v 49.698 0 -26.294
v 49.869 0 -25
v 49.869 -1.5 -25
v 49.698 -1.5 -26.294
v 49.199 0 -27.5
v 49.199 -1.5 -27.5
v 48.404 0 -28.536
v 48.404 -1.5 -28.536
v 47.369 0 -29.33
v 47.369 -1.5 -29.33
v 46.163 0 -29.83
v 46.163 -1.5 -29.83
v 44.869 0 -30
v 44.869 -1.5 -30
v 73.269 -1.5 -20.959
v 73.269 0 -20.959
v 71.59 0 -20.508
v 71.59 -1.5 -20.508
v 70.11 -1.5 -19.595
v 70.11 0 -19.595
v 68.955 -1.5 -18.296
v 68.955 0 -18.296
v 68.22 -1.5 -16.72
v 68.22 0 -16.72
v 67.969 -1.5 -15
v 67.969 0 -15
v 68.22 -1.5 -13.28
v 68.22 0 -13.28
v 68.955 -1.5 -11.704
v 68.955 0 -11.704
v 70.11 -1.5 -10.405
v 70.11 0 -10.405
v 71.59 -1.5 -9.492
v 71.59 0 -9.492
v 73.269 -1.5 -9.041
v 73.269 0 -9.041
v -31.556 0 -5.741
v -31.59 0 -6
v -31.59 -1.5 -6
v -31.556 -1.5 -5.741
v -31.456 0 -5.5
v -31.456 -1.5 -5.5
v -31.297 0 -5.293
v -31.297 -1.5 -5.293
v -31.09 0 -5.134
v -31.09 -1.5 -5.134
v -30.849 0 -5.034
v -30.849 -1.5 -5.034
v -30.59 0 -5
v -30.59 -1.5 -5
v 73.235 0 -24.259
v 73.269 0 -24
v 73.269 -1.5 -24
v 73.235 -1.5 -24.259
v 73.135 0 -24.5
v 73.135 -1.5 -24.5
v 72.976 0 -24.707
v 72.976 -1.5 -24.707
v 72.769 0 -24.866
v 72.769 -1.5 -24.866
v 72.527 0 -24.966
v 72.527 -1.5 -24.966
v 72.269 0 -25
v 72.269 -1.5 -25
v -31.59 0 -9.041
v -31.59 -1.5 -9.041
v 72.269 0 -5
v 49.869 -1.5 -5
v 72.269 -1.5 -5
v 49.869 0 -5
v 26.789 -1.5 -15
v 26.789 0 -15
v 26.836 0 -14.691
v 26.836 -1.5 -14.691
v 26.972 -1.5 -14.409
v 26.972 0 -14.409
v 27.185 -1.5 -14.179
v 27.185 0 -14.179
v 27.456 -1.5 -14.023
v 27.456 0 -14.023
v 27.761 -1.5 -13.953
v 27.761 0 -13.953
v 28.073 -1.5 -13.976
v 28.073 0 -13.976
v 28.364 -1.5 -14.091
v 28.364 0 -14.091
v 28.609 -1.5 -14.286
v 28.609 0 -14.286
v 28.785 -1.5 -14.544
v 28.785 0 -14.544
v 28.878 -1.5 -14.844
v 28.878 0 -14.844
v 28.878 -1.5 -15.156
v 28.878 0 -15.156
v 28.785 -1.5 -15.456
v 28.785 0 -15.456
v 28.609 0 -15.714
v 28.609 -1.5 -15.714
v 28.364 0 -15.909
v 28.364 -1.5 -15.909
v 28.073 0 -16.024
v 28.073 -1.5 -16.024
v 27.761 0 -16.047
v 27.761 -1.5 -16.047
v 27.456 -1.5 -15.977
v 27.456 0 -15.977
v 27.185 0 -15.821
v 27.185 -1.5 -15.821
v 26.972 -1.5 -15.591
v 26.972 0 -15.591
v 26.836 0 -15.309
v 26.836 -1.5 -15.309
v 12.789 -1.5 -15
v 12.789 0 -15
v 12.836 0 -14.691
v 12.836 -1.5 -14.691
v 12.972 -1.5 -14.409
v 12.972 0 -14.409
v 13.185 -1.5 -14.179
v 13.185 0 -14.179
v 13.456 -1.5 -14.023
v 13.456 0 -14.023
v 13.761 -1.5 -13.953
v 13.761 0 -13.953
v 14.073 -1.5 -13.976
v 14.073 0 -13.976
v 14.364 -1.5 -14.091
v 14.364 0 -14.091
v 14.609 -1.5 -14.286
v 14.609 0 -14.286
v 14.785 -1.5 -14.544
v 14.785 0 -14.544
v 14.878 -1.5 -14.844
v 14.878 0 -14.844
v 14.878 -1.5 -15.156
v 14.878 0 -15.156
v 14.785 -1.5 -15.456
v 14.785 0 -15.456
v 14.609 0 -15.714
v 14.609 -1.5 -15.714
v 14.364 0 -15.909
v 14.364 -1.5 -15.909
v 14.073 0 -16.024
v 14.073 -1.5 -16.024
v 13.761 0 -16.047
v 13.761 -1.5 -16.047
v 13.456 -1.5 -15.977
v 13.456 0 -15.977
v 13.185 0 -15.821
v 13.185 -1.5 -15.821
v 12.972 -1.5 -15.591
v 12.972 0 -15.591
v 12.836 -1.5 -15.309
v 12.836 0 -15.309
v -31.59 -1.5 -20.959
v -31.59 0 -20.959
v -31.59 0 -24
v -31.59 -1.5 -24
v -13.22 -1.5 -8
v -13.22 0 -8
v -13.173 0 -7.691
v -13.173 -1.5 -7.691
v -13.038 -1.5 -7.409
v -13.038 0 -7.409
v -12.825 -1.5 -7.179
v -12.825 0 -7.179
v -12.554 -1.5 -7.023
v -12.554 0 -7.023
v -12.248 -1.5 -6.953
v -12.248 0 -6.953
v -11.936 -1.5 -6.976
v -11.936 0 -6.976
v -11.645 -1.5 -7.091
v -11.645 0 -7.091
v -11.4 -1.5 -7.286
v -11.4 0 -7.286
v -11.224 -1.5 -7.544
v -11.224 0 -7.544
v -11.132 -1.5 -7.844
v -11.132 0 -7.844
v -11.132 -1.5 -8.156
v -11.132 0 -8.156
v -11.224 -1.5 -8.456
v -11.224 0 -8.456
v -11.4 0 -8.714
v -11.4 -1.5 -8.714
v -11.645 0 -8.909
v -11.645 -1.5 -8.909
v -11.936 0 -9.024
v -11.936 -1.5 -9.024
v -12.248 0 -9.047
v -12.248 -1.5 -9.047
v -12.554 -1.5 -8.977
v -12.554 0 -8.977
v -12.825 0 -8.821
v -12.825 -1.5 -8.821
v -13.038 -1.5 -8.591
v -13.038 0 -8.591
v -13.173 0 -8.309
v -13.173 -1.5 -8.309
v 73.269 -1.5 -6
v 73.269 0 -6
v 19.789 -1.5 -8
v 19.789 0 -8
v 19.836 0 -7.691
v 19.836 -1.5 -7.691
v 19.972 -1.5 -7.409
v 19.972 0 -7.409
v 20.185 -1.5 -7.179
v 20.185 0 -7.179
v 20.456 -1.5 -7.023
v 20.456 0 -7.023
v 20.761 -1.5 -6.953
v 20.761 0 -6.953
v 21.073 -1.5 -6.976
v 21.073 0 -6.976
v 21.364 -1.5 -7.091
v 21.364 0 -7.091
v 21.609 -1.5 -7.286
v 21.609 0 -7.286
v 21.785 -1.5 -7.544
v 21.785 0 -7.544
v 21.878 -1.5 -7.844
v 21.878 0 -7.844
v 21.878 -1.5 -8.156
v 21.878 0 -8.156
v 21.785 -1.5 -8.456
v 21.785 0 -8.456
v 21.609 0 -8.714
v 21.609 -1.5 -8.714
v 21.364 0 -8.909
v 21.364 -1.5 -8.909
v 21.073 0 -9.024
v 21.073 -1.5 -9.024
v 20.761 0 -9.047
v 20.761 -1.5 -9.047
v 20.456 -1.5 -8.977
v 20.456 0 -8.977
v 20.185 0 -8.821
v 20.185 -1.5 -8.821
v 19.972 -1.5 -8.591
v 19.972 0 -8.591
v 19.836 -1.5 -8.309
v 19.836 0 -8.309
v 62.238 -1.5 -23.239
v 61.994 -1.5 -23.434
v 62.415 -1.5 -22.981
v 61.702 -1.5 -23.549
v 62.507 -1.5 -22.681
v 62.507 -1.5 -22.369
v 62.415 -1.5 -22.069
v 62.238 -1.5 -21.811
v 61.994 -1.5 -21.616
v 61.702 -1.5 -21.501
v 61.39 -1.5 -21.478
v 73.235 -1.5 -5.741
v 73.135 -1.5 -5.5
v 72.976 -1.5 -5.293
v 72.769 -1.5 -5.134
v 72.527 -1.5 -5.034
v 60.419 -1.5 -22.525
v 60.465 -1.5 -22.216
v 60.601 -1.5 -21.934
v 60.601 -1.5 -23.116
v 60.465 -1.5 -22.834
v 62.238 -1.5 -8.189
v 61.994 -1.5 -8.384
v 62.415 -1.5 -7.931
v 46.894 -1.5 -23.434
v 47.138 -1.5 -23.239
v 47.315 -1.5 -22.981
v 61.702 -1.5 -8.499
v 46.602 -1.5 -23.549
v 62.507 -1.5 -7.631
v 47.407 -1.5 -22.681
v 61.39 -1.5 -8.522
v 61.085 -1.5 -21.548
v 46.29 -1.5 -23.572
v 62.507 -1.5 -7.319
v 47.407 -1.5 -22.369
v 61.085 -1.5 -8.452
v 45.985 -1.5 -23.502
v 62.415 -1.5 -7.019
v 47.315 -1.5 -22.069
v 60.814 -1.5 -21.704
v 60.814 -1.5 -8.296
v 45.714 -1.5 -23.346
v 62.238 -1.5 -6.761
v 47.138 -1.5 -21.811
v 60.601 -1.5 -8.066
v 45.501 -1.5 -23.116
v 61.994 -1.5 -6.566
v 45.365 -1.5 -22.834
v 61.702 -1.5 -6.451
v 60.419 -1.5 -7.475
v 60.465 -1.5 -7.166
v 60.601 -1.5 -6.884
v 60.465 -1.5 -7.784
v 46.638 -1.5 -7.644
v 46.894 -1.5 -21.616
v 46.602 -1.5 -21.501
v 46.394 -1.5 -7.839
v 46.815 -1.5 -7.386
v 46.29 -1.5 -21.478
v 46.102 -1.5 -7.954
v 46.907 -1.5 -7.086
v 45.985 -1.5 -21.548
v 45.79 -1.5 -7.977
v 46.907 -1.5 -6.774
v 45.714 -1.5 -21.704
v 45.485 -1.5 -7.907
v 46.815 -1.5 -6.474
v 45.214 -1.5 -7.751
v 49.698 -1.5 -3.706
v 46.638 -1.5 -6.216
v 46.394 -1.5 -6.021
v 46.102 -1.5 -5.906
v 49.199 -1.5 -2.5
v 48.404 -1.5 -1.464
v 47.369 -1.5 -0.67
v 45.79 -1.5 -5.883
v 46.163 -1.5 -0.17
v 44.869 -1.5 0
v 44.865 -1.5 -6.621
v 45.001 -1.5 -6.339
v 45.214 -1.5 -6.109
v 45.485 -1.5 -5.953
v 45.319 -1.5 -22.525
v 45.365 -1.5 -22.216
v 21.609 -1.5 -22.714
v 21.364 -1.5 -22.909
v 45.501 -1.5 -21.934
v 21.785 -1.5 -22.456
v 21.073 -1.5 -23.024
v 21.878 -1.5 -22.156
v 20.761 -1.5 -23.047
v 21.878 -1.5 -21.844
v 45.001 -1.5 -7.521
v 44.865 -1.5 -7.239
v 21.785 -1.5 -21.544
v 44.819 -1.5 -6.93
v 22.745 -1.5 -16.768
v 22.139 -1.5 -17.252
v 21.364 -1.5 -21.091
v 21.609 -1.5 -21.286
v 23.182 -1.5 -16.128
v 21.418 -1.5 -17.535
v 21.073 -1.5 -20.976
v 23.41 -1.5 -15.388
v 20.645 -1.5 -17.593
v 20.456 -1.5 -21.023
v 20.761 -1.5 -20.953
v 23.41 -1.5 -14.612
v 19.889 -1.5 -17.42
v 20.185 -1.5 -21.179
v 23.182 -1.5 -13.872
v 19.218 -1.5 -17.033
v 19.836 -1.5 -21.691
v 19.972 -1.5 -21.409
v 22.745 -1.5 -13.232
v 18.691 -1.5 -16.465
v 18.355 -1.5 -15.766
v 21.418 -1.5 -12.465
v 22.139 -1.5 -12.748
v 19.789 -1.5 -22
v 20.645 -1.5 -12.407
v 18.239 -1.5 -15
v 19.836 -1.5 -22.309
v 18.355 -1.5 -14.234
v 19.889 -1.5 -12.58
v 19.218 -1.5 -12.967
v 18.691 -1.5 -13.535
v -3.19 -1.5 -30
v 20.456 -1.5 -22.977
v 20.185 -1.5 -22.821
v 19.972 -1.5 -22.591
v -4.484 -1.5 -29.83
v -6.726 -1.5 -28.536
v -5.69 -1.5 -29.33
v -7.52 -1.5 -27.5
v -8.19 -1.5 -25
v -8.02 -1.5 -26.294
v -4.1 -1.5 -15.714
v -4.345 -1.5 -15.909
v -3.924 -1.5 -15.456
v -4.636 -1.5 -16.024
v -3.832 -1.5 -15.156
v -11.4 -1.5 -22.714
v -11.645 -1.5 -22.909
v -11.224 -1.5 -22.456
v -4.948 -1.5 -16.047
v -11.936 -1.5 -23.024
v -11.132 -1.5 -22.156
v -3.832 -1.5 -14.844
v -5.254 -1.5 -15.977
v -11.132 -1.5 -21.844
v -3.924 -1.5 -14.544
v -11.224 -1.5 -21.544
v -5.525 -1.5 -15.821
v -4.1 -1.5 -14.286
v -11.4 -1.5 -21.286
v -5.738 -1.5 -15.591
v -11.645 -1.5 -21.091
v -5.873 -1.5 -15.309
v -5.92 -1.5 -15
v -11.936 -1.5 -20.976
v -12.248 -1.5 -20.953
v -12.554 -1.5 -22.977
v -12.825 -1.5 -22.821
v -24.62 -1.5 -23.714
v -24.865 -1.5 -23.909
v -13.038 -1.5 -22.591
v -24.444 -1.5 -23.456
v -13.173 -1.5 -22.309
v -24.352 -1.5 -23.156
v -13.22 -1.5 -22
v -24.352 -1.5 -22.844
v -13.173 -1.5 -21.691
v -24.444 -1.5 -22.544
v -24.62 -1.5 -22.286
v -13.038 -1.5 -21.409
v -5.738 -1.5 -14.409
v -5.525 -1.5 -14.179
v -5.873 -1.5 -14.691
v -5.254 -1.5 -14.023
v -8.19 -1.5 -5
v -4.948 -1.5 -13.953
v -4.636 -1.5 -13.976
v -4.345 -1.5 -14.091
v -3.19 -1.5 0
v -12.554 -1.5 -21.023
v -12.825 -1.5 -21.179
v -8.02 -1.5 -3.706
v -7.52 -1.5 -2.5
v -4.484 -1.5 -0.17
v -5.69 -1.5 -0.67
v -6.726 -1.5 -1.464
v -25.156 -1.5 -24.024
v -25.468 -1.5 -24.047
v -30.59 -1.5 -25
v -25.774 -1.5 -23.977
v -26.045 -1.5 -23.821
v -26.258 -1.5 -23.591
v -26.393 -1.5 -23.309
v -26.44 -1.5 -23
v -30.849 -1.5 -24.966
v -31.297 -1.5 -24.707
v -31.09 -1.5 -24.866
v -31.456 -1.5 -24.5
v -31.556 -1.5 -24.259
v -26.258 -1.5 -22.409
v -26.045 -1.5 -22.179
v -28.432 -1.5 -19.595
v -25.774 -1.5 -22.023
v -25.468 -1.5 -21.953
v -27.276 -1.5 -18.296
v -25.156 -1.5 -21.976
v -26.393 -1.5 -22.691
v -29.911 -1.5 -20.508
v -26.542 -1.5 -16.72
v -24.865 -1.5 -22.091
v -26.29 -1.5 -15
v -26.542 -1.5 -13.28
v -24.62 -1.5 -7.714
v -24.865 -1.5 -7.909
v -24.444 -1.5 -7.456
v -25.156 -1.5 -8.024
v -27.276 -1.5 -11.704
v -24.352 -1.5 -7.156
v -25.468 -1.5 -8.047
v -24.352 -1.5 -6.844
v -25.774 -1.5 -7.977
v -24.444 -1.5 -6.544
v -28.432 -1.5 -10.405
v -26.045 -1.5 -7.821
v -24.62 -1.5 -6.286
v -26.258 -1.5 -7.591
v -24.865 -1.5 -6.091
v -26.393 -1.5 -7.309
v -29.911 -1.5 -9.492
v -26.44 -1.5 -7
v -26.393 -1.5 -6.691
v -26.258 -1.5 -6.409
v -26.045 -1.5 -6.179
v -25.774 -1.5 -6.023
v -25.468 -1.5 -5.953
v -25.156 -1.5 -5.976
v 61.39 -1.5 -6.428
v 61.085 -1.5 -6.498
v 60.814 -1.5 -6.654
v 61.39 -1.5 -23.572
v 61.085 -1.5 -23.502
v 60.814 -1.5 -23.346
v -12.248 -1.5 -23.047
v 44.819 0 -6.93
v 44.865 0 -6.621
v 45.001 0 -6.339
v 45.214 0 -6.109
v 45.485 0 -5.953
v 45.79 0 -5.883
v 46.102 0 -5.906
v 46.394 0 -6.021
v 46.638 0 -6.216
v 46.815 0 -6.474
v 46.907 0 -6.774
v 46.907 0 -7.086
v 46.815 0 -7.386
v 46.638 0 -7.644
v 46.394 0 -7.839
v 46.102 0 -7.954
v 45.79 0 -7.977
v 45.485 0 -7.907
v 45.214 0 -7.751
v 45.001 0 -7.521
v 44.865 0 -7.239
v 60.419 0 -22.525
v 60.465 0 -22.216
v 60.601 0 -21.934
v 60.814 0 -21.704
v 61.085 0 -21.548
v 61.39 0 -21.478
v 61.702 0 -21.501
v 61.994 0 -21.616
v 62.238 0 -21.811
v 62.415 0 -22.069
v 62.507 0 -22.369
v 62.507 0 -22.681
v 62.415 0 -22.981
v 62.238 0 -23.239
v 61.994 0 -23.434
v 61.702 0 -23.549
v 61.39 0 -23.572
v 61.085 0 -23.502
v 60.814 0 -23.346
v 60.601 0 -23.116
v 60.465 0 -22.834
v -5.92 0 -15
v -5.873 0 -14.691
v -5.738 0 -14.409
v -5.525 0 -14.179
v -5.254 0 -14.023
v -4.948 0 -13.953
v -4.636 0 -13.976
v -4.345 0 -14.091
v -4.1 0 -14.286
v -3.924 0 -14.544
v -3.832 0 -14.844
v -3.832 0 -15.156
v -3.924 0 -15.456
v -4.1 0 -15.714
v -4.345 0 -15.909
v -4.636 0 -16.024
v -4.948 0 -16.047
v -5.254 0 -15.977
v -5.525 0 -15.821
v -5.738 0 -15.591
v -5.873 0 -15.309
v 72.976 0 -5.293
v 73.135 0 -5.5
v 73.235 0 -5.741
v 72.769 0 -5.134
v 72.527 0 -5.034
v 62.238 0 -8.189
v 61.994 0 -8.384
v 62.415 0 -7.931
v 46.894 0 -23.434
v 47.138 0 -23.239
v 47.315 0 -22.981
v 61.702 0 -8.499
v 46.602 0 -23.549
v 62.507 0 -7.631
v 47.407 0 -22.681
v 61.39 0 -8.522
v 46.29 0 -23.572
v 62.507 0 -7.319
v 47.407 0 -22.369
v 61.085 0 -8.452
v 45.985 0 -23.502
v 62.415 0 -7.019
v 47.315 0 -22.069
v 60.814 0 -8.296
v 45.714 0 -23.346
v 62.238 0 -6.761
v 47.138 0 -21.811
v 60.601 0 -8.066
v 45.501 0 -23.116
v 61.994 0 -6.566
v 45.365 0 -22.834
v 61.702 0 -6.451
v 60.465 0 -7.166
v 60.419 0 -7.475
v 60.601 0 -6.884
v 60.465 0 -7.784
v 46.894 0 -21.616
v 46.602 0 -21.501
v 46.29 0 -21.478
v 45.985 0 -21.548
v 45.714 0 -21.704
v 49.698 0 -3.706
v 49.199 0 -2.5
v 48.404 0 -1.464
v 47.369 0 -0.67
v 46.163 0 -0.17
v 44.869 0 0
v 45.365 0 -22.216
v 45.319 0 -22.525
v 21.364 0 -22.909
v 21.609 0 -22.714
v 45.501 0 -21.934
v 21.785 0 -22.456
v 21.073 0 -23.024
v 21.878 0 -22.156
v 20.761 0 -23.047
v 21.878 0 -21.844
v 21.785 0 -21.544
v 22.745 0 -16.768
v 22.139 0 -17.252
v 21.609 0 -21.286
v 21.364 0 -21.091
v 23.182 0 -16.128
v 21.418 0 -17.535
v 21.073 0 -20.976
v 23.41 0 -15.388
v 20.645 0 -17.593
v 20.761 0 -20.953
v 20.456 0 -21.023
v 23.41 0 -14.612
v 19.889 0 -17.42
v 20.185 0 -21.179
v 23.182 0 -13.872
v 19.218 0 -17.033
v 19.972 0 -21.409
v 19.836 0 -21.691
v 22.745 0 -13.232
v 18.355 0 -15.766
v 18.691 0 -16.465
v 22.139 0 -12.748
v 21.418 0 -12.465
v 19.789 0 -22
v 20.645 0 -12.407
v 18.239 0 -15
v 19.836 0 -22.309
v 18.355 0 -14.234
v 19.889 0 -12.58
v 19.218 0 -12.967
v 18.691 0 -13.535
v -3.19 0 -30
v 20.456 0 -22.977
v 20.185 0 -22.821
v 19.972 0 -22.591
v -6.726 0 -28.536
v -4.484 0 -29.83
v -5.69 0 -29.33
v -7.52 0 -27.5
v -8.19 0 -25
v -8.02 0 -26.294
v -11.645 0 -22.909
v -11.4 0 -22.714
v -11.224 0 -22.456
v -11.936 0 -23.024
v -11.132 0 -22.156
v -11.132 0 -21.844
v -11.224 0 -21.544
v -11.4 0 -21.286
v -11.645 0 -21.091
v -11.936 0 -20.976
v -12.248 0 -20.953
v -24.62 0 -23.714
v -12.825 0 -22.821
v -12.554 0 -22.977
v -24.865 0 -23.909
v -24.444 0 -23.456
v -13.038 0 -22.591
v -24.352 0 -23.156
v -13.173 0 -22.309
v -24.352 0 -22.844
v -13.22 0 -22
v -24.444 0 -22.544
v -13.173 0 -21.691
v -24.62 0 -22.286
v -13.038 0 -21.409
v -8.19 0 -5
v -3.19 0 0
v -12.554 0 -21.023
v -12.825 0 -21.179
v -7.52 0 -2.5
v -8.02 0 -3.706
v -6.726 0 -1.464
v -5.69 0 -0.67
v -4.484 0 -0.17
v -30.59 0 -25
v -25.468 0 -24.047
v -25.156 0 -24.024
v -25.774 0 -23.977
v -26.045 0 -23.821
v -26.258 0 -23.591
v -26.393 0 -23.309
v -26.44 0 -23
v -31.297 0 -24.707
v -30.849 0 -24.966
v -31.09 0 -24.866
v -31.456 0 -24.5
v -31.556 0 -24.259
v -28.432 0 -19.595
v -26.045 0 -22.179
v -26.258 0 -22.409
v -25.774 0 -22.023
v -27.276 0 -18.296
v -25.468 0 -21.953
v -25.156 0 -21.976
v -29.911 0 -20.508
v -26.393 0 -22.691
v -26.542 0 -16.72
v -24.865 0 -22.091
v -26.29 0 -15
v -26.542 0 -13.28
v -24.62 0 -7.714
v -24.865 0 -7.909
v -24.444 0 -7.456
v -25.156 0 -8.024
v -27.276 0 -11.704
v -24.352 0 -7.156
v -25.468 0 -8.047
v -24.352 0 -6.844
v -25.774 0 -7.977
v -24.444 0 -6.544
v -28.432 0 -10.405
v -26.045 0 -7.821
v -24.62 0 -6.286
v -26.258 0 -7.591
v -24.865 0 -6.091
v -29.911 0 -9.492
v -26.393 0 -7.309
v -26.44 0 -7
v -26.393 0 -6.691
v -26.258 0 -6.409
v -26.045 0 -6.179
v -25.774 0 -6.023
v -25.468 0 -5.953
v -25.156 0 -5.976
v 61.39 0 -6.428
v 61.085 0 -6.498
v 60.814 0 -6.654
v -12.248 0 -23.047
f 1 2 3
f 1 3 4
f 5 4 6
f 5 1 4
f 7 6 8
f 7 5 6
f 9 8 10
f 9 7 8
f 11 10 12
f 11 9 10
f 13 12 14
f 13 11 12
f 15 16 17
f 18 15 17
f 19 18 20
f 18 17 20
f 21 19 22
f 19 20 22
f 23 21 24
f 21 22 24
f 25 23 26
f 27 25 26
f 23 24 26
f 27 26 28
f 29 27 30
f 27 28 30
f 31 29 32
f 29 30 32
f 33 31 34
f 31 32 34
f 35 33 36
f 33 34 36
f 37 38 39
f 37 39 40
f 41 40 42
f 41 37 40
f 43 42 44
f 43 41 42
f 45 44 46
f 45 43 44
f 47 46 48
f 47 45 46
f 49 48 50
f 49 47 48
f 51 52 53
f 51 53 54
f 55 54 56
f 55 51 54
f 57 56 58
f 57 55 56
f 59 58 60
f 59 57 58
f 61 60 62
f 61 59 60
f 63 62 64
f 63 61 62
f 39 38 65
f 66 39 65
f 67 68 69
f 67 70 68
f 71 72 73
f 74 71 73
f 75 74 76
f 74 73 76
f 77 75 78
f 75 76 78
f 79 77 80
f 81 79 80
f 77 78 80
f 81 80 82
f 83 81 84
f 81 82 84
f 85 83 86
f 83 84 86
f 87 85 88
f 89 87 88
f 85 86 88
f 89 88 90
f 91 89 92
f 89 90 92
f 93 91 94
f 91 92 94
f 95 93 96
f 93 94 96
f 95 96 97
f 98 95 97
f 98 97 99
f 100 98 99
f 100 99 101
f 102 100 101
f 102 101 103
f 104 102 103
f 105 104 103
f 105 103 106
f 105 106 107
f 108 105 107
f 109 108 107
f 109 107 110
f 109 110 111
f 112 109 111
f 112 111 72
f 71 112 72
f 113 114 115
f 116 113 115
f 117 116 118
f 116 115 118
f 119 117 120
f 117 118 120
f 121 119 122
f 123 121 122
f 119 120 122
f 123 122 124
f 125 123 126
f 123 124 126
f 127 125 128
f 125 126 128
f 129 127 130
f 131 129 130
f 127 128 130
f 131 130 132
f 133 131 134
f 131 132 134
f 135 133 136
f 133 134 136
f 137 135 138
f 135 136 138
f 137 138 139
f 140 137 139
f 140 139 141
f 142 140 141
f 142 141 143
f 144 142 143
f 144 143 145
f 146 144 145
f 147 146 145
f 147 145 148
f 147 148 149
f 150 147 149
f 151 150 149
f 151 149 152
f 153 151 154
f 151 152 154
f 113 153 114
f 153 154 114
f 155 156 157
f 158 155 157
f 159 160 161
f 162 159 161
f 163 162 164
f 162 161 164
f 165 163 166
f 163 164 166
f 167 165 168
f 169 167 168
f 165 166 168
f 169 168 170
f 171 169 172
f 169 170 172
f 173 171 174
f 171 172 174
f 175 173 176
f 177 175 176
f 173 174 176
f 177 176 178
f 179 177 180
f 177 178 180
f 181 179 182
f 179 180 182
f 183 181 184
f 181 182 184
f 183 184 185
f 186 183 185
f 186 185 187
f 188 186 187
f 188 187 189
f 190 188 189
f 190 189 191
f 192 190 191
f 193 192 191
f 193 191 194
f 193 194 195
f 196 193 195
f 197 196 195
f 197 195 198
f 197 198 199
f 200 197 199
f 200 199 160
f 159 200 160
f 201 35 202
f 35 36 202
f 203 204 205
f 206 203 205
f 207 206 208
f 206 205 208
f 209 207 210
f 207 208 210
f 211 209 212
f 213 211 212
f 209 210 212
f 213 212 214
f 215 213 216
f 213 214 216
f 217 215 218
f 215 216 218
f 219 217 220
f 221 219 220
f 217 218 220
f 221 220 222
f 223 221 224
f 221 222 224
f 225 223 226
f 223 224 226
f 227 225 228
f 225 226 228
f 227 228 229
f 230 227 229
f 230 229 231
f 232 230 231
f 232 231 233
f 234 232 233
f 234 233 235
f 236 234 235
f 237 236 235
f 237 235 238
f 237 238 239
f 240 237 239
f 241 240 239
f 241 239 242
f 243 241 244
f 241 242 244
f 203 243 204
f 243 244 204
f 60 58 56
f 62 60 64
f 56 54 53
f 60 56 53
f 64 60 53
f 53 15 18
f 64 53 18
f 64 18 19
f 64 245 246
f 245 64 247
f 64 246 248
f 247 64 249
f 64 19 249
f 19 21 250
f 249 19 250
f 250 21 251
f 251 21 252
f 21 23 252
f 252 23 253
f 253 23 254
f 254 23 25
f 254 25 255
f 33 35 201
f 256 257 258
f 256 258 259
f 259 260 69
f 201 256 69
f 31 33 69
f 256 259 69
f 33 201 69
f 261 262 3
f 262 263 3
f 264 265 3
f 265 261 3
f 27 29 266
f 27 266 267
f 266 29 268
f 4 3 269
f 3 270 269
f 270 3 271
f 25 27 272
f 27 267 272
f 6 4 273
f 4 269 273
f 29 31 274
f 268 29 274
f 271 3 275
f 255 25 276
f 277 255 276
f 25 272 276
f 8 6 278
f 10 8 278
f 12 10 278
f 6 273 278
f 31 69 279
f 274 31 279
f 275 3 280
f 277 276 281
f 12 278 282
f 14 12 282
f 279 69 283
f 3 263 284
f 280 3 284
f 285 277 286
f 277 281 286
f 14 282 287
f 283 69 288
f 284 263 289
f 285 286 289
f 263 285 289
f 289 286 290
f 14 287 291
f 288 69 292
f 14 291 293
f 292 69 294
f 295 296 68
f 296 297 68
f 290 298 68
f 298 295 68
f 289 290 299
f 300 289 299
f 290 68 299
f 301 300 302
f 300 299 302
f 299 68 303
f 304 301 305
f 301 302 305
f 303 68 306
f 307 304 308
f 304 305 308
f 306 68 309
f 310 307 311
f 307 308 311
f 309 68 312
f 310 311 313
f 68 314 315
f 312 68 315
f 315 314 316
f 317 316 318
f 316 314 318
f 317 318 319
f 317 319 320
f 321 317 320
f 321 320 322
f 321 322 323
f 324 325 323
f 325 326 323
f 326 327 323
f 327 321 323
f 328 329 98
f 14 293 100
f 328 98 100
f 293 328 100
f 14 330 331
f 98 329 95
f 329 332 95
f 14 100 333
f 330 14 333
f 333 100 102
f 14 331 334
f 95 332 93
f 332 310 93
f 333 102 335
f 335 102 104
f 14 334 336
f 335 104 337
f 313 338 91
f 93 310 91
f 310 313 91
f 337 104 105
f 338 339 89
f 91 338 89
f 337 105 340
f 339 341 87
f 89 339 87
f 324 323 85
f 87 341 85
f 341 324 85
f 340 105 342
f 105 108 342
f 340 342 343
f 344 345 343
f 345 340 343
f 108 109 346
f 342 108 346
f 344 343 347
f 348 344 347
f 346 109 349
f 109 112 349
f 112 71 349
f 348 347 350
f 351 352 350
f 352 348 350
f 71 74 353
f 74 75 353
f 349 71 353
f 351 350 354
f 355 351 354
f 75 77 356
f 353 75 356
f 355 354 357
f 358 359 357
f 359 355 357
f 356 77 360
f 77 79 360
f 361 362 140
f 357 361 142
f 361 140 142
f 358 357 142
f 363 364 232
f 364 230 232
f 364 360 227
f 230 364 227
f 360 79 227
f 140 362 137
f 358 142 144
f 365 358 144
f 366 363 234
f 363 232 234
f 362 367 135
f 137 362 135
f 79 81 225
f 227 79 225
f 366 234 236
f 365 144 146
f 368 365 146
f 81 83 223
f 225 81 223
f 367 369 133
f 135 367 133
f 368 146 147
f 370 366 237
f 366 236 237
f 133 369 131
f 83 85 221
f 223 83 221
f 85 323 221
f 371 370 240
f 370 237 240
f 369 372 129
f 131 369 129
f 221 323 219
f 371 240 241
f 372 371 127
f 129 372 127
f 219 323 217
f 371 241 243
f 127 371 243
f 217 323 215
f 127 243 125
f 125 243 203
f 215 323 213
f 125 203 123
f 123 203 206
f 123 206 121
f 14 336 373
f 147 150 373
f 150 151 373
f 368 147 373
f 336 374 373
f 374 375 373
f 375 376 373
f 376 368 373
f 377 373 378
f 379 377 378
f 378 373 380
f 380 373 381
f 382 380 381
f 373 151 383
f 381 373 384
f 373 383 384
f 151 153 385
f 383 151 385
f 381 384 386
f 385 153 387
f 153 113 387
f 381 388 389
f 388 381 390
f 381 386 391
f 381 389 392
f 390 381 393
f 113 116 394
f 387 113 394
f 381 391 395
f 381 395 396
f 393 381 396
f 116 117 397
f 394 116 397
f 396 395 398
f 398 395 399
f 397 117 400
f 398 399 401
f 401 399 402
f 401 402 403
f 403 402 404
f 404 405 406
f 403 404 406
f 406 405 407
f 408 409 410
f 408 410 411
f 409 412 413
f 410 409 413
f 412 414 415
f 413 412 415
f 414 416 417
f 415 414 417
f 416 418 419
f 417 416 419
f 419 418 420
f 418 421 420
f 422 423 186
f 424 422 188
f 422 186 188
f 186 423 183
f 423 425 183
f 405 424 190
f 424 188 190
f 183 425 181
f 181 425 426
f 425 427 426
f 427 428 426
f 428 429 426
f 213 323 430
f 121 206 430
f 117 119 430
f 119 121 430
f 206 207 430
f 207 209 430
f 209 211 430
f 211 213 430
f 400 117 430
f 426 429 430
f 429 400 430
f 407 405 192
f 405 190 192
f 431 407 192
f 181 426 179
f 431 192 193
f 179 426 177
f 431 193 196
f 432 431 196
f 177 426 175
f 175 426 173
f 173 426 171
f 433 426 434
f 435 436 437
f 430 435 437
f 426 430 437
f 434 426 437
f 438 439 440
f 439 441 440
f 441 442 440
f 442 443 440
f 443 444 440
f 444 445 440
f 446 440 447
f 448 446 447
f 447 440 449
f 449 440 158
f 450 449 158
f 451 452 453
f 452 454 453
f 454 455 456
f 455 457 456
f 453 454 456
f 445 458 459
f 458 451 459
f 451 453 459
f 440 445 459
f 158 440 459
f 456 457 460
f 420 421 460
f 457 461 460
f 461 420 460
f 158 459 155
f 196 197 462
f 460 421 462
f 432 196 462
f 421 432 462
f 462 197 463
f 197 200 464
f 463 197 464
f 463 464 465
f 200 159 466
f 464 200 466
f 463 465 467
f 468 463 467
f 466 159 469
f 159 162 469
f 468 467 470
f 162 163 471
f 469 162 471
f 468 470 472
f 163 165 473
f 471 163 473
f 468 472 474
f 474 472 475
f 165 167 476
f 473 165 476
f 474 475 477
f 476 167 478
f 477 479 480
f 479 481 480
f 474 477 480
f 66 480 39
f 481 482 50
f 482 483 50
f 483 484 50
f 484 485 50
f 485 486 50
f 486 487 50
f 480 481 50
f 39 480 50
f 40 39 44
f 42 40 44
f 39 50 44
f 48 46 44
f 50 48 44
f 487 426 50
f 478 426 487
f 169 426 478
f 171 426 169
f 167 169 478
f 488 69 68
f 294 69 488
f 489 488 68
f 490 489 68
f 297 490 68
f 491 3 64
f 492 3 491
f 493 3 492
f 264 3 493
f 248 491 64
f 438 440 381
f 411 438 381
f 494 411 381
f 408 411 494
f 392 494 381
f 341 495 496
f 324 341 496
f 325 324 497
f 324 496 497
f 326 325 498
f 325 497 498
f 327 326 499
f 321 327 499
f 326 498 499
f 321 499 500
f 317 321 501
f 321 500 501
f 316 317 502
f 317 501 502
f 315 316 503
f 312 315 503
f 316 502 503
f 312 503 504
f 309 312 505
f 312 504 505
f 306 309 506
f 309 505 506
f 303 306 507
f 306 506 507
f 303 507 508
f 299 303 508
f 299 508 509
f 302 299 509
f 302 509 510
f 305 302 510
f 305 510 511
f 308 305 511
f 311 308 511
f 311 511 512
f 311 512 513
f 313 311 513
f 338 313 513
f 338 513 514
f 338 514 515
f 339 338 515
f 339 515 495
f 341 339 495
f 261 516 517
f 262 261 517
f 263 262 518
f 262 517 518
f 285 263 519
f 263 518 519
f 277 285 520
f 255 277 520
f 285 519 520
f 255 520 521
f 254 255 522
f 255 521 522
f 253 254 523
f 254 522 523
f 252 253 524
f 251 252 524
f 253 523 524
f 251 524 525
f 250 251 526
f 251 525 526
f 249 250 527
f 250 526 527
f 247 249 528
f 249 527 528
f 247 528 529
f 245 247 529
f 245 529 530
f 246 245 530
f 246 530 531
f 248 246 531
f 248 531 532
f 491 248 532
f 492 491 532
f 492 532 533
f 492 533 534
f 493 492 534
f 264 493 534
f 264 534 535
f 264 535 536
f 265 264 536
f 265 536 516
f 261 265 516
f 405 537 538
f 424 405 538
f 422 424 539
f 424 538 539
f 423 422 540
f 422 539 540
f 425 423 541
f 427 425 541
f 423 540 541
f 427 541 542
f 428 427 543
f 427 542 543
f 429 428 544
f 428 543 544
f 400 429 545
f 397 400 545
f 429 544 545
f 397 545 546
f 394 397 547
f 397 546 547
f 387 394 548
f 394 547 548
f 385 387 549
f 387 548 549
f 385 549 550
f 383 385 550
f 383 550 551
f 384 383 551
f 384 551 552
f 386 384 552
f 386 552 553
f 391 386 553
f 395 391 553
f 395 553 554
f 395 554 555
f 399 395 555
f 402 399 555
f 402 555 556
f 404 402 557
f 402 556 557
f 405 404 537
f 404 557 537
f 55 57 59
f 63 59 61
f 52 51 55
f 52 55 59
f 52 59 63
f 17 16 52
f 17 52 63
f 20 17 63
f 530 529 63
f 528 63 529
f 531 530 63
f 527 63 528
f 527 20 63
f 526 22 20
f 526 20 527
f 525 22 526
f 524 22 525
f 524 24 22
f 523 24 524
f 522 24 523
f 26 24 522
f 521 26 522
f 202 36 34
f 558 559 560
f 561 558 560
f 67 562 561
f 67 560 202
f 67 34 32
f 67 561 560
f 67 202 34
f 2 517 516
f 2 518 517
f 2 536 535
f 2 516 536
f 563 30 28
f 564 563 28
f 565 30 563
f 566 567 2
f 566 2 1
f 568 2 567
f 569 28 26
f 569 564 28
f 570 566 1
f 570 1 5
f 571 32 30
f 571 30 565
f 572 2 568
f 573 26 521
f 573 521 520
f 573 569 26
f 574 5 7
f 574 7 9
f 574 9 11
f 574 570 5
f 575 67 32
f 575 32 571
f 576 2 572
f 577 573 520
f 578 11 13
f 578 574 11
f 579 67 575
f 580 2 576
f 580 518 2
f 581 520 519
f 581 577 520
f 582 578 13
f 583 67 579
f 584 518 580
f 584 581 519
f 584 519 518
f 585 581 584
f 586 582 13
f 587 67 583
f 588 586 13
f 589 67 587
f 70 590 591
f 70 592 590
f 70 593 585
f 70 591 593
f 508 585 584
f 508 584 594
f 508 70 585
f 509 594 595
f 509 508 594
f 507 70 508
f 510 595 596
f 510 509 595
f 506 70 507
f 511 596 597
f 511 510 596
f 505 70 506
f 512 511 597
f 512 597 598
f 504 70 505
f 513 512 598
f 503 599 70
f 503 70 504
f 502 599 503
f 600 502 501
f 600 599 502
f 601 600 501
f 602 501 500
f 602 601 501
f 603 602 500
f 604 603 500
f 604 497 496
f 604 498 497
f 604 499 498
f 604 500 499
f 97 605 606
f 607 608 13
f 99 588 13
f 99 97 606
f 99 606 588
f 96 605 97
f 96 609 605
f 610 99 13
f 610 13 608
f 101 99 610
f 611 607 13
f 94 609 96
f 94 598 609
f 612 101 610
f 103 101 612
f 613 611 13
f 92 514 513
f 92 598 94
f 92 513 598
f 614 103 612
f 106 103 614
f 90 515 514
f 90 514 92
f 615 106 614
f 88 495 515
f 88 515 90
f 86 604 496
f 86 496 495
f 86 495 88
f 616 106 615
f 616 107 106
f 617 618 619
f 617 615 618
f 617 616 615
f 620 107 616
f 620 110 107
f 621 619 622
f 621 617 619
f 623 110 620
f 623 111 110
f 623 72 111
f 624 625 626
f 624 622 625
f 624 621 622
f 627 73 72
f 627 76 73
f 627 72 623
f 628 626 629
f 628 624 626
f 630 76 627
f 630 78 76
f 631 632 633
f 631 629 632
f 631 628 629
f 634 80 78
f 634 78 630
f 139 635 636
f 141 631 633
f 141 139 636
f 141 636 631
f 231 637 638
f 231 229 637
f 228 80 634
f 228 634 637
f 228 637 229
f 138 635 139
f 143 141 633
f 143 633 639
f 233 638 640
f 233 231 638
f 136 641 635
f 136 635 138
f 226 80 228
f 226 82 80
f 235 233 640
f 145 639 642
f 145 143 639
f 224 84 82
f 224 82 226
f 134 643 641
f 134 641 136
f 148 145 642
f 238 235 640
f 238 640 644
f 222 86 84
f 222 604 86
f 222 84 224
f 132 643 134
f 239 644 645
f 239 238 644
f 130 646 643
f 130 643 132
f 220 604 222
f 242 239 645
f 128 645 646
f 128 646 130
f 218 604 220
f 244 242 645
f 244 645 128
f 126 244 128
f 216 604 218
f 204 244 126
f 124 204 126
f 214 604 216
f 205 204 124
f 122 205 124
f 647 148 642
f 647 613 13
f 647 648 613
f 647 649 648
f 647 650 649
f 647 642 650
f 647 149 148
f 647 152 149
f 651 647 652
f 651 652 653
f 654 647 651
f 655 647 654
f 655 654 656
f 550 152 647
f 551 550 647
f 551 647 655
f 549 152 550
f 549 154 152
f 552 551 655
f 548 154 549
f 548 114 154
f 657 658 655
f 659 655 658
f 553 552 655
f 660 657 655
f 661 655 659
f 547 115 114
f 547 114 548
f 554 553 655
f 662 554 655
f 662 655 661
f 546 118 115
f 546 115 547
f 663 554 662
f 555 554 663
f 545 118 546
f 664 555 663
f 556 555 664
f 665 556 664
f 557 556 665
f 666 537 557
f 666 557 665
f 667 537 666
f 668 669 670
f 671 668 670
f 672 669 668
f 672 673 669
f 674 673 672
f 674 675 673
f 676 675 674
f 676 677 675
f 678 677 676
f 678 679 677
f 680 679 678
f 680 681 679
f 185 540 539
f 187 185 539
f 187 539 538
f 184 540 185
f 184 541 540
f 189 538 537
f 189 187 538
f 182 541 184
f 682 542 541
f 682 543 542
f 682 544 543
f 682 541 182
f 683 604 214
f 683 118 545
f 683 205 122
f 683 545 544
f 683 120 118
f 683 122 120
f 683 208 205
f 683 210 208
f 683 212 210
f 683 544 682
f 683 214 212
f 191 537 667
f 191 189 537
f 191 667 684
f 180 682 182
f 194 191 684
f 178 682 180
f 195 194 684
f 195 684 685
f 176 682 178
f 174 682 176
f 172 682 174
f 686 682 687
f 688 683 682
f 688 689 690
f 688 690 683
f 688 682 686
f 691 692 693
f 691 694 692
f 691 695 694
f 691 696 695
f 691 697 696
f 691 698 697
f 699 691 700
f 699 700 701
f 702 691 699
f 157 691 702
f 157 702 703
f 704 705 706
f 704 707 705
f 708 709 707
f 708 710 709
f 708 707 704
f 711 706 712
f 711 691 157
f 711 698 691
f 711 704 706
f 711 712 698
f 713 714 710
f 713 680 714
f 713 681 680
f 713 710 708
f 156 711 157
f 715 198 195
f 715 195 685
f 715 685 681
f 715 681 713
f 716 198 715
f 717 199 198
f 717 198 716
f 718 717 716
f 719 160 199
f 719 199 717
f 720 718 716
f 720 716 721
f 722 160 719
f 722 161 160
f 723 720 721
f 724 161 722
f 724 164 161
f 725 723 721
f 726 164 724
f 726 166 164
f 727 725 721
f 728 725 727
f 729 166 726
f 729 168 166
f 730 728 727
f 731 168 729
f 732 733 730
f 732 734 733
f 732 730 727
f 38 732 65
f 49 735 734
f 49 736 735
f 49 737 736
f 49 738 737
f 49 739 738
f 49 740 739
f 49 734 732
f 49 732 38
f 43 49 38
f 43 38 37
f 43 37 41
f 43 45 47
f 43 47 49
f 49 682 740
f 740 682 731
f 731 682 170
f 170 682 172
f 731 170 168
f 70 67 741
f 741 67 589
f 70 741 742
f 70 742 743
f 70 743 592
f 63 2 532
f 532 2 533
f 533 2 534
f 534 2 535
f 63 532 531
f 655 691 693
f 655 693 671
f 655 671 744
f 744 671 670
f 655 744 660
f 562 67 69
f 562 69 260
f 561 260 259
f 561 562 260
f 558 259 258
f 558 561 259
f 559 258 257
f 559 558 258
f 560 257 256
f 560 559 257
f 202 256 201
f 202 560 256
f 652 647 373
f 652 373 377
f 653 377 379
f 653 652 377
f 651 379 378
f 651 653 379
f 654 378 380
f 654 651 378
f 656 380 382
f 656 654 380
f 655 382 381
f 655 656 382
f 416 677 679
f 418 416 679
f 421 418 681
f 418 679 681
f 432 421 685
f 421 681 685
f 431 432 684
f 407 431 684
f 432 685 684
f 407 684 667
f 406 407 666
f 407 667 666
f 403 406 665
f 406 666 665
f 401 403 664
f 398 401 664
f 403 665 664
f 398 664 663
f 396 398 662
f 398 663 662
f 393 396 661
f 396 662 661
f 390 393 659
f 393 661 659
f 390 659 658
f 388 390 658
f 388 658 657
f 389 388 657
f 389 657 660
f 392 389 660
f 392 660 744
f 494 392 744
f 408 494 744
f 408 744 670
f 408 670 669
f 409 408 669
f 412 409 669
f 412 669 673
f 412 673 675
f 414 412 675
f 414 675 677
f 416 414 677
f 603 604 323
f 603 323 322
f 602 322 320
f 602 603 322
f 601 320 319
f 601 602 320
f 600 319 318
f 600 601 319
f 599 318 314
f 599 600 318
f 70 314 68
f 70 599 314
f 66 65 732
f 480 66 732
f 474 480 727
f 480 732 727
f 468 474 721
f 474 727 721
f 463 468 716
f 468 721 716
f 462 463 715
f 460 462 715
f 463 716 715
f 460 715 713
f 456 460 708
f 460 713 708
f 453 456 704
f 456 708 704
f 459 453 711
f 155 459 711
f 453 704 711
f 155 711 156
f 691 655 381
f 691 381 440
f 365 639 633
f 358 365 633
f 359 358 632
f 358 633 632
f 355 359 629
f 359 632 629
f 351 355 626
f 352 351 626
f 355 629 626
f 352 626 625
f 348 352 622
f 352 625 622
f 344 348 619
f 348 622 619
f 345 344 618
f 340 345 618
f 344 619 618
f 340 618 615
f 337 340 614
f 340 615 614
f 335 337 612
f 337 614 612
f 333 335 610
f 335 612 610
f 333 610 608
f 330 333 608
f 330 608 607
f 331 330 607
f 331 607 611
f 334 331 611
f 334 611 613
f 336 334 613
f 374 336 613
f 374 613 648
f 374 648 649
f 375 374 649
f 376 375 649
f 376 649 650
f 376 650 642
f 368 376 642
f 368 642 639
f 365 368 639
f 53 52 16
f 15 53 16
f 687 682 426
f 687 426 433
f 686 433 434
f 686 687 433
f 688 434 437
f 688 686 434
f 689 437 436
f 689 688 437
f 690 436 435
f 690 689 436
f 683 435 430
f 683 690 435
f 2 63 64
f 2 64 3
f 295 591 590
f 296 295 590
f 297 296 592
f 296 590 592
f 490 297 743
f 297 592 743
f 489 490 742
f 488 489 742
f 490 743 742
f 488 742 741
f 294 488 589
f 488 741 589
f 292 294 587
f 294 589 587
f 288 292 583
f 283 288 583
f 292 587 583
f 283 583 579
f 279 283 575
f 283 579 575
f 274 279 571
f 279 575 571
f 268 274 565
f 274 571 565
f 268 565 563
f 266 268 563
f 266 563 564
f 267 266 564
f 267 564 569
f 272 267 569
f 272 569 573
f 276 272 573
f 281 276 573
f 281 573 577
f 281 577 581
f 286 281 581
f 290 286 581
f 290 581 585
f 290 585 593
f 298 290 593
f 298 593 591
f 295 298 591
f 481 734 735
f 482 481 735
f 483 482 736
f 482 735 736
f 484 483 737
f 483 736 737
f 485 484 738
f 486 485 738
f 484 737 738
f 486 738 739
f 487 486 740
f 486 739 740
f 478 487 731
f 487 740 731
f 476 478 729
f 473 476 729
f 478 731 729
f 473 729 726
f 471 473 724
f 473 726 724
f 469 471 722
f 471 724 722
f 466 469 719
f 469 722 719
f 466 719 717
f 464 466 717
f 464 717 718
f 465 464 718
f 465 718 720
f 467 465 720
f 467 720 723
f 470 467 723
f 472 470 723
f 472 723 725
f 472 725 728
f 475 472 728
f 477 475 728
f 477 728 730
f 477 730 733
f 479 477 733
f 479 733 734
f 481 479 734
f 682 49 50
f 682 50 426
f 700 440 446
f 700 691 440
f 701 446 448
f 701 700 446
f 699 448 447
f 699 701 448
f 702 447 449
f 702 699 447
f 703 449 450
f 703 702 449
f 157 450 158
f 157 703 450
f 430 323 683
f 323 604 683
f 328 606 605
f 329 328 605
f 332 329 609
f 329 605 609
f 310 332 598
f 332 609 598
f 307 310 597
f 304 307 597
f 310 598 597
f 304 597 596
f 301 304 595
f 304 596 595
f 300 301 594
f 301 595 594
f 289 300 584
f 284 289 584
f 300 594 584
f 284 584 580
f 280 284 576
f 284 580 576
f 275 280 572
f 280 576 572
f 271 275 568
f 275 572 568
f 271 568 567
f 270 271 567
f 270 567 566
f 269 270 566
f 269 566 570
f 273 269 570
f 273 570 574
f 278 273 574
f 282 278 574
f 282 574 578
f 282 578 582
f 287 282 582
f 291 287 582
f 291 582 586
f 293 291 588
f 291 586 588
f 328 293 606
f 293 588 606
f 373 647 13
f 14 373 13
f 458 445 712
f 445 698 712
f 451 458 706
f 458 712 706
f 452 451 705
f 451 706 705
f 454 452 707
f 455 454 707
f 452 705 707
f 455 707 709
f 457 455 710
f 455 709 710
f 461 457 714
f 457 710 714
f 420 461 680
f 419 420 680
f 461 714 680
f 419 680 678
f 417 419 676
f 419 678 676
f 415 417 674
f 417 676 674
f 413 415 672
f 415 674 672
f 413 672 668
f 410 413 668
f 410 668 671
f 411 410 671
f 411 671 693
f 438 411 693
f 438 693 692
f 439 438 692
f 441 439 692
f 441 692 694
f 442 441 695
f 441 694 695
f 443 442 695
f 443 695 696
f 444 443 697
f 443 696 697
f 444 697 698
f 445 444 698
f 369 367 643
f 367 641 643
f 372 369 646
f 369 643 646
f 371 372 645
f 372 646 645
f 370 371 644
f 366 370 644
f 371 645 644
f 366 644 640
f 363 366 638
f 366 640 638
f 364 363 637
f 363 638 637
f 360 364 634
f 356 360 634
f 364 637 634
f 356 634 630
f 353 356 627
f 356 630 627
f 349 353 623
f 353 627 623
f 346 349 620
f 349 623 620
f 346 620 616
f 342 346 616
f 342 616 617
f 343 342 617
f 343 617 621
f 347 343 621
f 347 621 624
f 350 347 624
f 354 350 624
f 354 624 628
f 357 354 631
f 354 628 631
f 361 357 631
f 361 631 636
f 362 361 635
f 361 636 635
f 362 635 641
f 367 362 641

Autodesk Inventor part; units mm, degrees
ref_plane "YZ Plane" through (0, 0, 0) normal (1, 0, 0) x (0, 1, 0)
ref_plane "XZ Plane" through (0, 0, 0) normal (0, 1, 0) x (-1, 0, 0)
ref_plane "XY Plane" through (0, 0, 0) normal (0, 0, 1) x (1, 0, 0)
sketch "Sketch1" plane through (0, 0, 0) normal (0, 1, 0) x (-1, 0, 0)
  line L0 (-0.4496, -30) -> (-0.4496, 0)
  line L1 (-41.2289, 0) -> (-41.2289, -30)
  circle A0 centre (-20.8393, -15) radius 2.6
  circle A1 centre (-61.4686, -7.475) radius 1.05
  circle A2 centre (-61.4686, -22.525) radius 1.05
  circle A3 centre (-45.8686, -6.93) radius 1.05
  circle A4 centre (-46.3686, -22.525) radius 1.05
  circle A5 centre (4.87, -15) radius 1.05
  circle A6 centre (12.17, -8) radius 1.05
  circle A7 centre (25.39, -7) radius 1.05
  circle A8 centre (12.17, -22) radius 1.05
  circle A9 centre (25.39, -23) radius 1.05
  circle A10 centre (-27.8393, -15) radius 1.05
  circle A11 centre (-20.8393, -8) radius 1.05
  circle A12 centre (-20.8393, -22) radius 1.05
  circle A13 centre (-13.8393, -15) radius 1.05
  arc A14 (-72.2686, -5) -> (-73.2686, -6) centre (-72.2686, -6) ccw
  line L2 (-73.2686, -9.041) -> (-73.2686, -6)
  arc A15 (31.59, -6) -> (30.59, -5) centre (30.59, -6) ccw
  line L3 (31.59, -6) -> (31.59, -9.041)
  arc A16 (30.59, -25) -> (31.59, -24) centre (30.59, -24) ccw
  line L4 (8.19, -25) -> (30.59, -25)
  arc A17 (-73.2686, -24) -> (-72.2686, -25) centre (-72.2686, -24) ccw
  line L5 (-73.2686, -24) -> (-73.2686, -20.959)
  arc A18 (-73.2686, -20.959) -> (-73.2686, -9.041) centre (-73.9686, -15) ccw
  line L6 (-72.2686, -25) -> (-49.8686, -25)
  arc A19 (-49.8686, -25) -> (-44.8686, -30) centre (-44.8686, -25) ccw
  line L7 (3.19, -30) -> (-44.8686, -30)
  arc A20 (3.19, -30) -> (8.19, -25) centre (3.19, -25) ccw
  line L8 (31.59, -20.959) -> (31.59, -24)
  arc A21 (31.59, -9.041) -> (31.59, -20.959) centre (32.29, -15) ccw
  line L9 (30.59, -5) -> (8.19, -5)
  arc A22 (8.19, -5) -> (3.19, 0) centre (3.19, -5) ccw
  line L10 (-44.8686, 0) -> (3.19, 0)
  arc A23 (-44.8686, 0) -> (-49.8686, -5) centre (-44.8686, -5) ccw
  line L11 (-49.8686, -5) -> (-72.2686, -5)
  line L12 (-41.6786, -30) -> (-41.6786, 0)
  line L13 (-40.7793, 0) -> (-40.7793, -30)
  line L14 (-0.8993, -30) -> (-0.8993, 0)
  line L15 (0, 0) -> (0, -30)
extrude "Extrusion1" add sketch "Sketch1" against normal blind 1.5
properties part number "axis_19_top_frame"
